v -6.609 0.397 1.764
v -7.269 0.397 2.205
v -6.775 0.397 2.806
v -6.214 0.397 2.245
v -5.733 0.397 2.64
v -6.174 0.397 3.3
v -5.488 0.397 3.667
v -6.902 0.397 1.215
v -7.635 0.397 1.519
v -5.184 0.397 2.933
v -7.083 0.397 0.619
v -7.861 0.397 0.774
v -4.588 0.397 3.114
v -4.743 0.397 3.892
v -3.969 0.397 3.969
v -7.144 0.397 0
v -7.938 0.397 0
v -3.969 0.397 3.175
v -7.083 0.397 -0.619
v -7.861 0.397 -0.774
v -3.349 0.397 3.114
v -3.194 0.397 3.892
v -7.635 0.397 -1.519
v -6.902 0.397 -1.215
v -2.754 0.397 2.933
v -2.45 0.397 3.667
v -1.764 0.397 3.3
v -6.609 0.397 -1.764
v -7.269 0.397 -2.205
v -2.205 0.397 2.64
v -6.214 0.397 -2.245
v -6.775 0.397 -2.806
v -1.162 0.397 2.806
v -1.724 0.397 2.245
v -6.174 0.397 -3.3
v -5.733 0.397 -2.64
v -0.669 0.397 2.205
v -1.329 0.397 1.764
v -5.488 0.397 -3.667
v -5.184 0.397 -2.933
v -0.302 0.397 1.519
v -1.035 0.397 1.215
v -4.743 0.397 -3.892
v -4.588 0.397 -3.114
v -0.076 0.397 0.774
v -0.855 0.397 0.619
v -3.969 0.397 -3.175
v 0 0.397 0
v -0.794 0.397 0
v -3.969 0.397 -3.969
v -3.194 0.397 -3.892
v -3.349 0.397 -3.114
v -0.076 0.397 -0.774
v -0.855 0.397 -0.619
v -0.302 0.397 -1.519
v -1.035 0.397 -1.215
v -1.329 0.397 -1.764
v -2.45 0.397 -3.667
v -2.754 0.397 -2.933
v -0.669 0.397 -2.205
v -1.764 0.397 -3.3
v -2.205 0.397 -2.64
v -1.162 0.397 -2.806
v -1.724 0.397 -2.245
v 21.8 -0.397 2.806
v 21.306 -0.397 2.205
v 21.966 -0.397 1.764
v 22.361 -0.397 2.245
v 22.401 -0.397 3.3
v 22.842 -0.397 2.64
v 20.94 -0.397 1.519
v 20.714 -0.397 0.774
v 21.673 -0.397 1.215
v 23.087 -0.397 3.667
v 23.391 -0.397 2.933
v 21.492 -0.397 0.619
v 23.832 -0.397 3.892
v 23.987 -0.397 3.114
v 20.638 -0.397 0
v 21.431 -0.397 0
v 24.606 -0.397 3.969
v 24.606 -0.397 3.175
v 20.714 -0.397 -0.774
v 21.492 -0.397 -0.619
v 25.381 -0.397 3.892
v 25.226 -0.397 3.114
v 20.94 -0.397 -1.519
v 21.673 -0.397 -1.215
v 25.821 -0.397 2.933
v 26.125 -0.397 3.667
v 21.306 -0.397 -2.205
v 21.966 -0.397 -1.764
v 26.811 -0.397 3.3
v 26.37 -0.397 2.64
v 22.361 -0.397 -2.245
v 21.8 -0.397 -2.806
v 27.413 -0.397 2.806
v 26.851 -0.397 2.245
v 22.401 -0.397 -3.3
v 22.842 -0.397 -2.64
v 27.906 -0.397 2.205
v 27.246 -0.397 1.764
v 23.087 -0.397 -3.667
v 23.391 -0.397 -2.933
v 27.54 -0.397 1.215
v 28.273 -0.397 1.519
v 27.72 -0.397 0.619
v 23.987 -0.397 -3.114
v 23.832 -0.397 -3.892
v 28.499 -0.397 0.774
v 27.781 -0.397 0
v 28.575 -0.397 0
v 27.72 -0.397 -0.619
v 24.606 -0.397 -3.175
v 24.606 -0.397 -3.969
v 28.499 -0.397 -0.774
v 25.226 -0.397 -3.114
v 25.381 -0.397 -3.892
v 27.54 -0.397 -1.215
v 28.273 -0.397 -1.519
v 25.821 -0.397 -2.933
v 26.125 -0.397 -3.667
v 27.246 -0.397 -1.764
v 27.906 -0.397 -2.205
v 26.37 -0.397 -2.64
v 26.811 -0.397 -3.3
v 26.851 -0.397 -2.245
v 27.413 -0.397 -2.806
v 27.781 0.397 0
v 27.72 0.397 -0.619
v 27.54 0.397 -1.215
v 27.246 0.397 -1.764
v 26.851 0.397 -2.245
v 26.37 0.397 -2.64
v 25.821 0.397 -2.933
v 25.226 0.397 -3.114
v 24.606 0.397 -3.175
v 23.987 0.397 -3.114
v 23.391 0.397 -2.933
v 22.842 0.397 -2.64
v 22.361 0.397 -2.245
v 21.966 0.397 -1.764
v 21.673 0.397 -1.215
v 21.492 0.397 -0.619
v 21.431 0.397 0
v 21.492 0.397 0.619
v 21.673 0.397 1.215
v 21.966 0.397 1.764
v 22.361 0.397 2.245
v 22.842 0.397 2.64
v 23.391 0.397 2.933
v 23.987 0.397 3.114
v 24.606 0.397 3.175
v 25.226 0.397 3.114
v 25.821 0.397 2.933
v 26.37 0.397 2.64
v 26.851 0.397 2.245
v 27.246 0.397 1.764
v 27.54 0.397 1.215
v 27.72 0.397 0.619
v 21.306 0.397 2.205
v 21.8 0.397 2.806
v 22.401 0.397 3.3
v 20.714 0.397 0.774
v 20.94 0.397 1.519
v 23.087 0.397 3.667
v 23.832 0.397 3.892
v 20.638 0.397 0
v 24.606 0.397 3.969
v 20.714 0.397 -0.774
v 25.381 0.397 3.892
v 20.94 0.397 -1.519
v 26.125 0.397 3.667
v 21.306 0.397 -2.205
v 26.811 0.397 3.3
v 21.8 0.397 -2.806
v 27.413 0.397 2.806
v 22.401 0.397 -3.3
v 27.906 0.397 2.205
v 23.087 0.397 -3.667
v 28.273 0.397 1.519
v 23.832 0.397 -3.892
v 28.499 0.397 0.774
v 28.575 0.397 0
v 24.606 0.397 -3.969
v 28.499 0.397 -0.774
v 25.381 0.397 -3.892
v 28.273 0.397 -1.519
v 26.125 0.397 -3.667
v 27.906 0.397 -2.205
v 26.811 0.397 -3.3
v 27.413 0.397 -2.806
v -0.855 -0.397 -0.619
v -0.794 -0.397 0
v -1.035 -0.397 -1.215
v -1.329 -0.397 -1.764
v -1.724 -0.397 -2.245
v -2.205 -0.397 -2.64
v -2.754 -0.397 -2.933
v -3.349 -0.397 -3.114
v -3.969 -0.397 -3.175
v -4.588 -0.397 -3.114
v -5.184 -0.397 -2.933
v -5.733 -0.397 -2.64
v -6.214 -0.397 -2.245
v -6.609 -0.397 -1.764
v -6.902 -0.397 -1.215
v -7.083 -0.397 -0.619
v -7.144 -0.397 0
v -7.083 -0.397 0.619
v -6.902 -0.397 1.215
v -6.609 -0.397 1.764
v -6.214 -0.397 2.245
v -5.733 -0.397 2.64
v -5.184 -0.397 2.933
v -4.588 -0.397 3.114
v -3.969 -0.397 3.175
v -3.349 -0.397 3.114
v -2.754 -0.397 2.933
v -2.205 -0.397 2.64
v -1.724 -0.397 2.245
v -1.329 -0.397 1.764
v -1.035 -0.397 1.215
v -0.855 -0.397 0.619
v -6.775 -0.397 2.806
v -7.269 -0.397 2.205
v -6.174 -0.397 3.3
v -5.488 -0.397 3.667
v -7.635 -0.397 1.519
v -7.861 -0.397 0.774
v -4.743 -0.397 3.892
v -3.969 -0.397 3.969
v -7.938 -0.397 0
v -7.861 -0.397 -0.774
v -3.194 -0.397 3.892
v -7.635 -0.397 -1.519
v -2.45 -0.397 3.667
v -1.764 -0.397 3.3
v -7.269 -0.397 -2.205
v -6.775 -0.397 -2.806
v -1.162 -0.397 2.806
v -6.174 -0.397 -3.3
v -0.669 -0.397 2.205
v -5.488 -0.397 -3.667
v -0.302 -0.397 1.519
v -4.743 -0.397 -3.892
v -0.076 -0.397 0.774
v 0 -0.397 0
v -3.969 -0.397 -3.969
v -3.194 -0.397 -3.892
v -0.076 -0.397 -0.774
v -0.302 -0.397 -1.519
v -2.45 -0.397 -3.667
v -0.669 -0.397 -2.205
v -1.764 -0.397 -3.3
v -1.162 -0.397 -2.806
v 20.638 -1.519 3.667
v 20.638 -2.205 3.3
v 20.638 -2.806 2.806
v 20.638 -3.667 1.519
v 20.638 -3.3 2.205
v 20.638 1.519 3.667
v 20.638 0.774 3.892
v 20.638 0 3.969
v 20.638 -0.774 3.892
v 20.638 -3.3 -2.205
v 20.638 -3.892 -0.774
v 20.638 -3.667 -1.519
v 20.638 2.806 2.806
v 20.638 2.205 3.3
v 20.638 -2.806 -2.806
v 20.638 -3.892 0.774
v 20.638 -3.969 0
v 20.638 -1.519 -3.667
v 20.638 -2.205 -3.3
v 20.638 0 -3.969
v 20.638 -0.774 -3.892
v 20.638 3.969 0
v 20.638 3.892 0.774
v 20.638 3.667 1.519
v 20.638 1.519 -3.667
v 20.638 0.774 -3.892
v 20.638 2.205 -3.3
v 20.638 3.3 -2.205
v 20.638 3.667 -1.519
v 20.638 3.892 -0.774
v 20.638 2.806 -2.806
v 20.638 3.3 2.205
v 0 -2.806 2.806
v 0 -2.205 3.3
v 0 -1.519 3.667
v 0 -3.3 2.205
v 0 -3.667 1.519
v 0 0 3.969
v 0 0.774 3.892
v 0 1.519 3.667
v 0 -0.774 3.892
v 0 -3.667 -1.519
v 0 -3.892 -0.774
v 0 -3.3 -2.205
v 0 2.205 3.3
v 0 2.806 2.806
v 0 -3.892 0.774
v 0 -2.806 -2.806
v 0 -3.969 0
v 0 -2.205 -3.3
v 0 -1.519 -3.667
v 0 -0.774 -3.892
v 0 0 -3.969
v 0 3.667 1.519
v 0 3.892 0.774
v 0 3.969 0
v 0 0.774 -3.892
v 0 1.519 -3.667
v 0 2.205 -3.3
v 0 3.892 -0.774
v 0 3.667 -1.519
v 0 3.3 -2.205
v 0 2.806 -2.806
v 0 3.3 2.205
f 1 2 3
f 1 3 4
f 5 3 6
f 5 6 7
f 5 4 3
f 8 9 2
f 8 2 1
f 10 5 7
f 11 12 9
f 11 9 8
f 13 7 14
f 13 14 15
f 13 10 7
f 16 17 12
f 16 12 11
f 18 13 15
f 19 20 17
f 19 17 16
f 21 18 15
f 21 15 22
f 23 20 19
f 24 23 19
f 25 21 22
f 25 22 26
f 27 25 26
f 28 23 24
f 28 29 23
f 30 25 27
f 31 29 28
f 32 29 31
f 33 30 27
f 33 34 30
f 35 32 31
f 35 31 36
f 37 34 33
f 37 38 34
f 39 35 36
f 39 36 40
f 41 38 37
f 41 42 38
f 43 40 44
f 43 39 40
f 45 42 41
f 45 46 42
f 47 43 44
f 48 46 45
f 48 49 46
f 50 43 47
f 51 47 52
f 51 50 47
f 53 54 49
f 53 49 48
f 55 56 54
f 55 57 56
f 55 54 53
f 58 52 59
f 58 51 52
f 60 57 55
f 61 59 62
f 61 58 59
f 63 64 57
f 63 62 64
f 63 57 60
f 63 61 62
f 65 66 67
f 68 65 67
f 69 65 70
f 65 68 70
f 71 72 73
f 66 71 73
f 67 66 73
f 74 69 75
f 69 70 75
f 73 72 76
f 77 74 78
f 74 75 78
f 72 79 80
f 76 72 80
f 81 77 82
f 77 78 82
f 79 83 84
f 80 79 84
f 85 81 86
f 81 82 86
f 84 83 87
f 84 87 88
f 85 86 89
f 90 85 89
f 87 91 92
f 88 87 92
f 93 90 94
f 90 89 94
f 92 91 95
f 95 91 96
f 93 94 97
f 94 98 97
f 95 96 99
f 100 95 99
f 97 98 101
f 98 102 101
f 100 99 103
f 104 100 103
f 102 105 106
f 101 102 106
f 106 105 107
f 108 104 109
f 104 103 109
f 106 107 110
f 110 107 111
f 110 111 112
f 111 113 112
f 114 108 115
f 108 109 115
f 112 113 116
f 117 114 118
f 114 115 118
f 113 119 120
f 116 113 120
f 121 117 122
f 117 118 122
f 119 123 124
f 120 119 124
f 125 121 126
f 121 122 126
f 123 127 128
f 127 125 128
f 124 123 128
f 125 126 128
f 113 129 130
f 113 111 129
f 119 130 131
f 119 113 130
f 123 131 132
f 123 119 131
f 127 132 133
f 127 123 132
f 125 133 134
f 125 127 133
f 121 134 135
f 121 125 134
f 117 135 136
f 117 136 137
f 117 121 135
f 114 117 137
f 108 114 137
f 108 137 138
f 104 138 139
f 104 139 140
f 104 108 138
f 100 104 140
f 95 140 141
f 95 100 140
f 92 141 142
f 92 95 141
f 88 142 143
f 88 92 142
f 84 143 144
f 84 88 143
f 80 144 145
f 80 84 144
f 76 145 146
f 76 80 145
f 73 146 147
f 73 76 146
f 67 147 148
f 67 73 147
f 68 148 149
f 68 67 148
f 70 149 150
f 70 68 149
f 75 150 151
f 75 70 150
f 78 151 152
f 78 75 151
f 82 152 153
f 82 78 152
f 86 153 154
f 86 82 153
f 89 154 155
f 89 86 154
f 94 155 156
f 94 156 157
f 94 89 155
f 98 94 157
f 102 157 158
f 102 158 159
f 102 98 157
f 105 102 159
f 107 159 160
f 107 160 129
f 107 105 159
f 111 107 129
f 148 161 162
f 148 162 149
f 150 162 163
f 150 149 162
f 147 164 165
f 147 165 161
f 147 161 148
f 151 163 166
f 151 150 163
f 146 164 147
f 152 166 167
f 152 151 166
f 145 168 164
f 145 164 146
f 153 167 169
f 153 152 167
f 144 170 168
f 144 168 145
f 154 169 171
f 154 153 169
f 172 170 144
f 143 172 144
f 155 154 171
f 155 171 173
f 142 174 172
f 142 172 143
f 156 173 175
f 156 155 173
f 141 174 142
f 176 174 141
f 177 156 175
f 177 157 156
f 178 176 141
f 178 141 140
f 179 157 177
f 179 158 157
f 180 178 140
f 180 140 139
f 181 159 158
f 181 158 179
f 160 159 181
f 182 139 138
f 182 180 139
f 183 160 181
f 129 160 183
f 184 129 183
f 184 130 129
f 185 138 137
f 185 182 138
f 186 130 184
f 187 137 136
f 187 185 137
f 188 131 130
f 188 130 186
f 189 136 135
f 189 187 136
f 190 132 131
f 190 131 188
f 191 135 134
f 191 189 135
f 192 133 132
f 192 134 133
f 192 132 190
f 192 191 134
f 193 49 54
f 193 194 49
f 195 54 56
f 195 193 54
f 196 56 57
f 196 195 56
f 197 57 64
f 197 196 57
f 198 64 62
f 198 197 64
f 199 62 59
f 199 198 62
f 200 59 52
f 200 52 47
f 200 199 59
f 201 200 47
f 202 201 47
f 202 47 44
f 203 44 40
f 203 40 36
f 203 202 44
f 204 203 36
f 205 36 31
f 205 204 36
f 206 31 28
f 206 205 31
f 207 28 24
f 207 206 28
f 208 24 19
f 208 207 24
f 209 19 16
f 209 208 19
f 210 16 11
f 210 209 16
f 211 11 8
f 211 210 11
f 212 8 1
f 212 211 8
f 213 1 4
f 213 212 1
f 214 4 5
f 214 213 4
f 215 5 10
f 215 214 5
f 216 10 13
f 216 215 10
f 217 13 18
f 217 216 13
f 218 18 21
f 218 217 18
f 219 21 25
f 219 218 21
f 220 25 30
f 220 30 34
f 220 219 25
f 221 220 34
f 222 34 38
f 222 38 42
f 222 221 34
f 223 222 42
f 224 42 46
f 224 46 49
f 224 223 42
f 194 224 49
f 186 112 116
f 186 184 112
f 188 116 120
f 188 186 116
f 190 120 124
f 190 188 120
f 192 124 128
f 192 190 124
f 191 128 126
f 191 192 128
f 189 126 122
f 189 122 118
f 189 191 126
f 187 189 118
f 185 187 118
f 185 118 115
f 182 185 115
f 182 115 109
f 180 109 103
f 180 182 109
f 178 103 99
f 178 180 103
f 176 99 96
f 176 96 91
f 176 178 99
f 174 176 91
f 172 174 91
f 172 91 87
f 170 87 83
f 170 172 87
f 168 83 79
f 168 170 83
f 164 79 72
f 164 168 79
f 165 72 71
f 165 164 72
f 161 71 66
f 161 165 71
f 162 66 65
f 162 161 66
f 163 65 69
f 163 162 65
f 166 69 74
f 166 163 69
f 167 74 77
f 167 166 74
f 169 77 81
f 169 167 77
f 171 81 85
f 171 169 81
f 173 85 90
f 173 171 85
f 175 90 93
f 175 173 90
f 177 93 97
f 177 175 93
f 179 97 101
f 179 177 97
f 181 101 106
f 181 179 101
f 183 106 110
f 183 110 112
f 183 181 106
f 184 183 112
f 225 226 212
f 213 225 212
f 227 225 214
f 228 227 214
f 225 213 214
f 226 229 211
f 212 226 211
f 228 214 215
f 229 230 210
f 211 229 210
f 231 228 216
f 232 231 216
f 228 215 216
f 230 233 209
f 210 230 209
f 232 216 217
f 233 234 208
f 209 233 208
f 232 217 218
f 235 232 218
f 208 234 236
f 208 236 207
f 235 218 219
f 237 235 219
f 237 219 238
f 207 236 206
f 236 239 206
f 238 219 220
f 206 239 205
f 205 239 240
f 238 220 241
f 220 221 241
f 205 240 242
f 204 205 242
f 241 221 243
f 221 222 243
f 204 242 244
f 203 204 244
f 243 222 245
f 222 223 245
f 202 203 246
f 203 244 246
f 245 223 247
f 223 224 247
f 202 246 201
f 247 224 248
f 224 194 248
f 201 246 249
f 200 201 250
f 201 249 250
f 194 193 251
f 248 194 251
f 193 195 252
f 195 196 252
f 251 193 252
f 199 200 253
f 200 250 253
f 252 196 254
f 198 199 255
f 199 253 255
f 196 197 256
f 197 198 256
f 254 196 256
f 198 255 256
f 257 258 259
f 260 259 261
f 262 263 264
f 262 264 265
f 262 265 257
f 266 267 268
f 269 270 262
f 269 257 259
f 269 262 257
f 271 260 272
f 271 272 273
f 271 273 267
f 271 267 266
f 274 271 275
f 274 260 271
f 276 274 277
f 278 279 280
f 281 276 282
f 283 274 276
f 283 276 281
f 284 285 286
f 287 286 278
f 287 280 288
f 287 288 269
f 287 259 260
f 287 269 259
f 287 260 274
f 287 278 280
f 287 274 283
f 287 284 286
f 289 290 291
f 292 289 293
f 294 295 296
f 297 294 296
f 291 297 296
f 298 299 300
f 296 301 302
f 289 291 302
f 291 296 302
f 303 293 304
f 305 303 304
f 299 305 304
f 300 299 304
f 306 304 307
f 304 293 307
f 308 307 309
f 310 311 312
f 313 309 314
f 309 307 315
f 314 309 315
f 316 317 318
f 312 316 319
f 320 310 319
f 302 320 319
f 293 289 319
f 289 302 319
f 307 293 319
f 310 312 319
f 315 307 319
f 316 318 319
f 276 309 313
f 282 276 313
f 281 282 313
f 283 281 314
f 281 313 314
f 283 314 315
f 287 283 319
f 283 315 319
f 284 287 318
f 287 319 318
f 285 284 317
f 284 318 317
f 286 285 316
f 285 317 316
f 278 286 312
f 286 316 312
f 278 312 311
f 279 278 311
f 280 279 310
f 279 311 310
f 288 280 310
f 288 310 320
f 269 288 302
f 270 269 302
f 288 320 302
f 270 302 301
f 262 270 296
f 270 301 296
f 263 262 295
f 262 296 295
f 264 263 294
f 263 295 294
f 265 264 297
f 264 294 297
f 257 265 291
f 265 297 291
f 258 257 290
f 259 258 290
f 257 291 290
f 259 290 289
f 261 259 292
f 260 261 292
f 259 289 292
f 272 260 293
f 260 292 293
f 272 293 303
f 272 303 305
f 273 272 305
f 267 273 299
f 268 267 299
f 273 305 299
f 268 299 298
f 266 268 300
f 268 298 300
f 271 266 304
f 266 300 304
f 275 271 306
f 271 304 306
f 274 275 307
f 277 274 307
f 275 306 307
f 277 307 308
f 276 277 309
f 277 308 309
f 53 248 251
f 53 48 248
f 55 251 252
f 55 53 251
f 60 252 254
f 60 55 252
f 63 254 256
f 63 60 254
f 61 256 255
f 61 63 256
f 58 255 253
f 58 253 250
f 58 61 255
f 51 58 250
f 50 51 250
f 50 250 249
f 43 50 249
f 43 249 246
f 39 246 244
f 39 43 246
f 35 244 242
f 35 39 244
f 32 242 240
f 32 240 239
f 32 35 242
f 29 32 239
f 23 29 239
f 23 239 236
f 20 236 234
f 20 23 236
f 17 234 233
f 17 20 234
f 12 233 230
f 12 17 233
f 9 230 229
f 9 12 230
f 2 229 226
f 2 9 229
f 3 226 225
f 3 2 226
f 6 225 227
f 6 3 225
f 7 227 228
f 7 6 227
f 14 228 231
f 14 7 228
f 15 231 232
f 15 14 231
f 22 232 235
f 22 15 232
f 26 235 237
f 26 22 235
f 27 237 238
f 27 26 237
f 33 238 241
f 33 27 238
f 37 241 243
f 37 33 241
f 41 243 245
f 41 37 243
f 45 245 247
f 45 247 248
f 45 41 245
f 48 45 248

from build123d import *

# Parameters (mm, degrees)
SKETCH1_R             = 3.96875
BOSS_EXTRUDE1_DEPTH   = 20.6375
SKETCH3_R             = 3.96875
SKETCH3_R_2           = 3.175
BOSS_EXTRUDE2_DEPTH   = 0.396875
BOSS_EXTRUDE2_2_DEPTH = 0.396875


with BuildPart() as part:
    # Sketch1 → Boss-Extrude1 (new body)
    with BuildSketch(Plane(origin=(0, 0, 0), x_dir=(0, 0, -1), z_dir=(1, 0, 0))):
        Circle(SKETCH1_R)
    extrude(amount=BOSS_EXTRUDE1_DEPTH)


with BuildPart() as body_2:
    # Sketch3 → Boss-Extrude2 (new body, symmetric)
    with BuildSketch(Plane(origin=(0, 0, 0), x_dir=(1, 0, 0), z_dir=(0, 1, 0))):
        with Locations((-3.96875, 0)):
            Circle(SKETCH3_R)
        with Locations((-3.96875, 0)):
            Circle(SKETCH3_R_2, mode=Mode.SUBTRACT)
    extrude(amount=BOSS_EXTRUDE2_DEPTH, both=True)


with BuildPart() as body_3:
    # Sketch3 → Boss-Extrude2 2 (new body, symmetric)
    with BuildSketch(Plane(origin=(0, 0, 0), x_dir=(1, 0, 0), z_dir=(0, 1, 0))):
        with Locations((24.60625, 0)):
            Circle(SKETCH3_R)
        with Locations((24.60625, 0)):
            Circle(SKETCH3_R_2, mode=Mode.SUBTRACT)
    extrude(amount=BOSS_EXTRUDE2_2_DEPTH, both=True)


solid = Compound([part.part, body_2.part, body_3.part])
